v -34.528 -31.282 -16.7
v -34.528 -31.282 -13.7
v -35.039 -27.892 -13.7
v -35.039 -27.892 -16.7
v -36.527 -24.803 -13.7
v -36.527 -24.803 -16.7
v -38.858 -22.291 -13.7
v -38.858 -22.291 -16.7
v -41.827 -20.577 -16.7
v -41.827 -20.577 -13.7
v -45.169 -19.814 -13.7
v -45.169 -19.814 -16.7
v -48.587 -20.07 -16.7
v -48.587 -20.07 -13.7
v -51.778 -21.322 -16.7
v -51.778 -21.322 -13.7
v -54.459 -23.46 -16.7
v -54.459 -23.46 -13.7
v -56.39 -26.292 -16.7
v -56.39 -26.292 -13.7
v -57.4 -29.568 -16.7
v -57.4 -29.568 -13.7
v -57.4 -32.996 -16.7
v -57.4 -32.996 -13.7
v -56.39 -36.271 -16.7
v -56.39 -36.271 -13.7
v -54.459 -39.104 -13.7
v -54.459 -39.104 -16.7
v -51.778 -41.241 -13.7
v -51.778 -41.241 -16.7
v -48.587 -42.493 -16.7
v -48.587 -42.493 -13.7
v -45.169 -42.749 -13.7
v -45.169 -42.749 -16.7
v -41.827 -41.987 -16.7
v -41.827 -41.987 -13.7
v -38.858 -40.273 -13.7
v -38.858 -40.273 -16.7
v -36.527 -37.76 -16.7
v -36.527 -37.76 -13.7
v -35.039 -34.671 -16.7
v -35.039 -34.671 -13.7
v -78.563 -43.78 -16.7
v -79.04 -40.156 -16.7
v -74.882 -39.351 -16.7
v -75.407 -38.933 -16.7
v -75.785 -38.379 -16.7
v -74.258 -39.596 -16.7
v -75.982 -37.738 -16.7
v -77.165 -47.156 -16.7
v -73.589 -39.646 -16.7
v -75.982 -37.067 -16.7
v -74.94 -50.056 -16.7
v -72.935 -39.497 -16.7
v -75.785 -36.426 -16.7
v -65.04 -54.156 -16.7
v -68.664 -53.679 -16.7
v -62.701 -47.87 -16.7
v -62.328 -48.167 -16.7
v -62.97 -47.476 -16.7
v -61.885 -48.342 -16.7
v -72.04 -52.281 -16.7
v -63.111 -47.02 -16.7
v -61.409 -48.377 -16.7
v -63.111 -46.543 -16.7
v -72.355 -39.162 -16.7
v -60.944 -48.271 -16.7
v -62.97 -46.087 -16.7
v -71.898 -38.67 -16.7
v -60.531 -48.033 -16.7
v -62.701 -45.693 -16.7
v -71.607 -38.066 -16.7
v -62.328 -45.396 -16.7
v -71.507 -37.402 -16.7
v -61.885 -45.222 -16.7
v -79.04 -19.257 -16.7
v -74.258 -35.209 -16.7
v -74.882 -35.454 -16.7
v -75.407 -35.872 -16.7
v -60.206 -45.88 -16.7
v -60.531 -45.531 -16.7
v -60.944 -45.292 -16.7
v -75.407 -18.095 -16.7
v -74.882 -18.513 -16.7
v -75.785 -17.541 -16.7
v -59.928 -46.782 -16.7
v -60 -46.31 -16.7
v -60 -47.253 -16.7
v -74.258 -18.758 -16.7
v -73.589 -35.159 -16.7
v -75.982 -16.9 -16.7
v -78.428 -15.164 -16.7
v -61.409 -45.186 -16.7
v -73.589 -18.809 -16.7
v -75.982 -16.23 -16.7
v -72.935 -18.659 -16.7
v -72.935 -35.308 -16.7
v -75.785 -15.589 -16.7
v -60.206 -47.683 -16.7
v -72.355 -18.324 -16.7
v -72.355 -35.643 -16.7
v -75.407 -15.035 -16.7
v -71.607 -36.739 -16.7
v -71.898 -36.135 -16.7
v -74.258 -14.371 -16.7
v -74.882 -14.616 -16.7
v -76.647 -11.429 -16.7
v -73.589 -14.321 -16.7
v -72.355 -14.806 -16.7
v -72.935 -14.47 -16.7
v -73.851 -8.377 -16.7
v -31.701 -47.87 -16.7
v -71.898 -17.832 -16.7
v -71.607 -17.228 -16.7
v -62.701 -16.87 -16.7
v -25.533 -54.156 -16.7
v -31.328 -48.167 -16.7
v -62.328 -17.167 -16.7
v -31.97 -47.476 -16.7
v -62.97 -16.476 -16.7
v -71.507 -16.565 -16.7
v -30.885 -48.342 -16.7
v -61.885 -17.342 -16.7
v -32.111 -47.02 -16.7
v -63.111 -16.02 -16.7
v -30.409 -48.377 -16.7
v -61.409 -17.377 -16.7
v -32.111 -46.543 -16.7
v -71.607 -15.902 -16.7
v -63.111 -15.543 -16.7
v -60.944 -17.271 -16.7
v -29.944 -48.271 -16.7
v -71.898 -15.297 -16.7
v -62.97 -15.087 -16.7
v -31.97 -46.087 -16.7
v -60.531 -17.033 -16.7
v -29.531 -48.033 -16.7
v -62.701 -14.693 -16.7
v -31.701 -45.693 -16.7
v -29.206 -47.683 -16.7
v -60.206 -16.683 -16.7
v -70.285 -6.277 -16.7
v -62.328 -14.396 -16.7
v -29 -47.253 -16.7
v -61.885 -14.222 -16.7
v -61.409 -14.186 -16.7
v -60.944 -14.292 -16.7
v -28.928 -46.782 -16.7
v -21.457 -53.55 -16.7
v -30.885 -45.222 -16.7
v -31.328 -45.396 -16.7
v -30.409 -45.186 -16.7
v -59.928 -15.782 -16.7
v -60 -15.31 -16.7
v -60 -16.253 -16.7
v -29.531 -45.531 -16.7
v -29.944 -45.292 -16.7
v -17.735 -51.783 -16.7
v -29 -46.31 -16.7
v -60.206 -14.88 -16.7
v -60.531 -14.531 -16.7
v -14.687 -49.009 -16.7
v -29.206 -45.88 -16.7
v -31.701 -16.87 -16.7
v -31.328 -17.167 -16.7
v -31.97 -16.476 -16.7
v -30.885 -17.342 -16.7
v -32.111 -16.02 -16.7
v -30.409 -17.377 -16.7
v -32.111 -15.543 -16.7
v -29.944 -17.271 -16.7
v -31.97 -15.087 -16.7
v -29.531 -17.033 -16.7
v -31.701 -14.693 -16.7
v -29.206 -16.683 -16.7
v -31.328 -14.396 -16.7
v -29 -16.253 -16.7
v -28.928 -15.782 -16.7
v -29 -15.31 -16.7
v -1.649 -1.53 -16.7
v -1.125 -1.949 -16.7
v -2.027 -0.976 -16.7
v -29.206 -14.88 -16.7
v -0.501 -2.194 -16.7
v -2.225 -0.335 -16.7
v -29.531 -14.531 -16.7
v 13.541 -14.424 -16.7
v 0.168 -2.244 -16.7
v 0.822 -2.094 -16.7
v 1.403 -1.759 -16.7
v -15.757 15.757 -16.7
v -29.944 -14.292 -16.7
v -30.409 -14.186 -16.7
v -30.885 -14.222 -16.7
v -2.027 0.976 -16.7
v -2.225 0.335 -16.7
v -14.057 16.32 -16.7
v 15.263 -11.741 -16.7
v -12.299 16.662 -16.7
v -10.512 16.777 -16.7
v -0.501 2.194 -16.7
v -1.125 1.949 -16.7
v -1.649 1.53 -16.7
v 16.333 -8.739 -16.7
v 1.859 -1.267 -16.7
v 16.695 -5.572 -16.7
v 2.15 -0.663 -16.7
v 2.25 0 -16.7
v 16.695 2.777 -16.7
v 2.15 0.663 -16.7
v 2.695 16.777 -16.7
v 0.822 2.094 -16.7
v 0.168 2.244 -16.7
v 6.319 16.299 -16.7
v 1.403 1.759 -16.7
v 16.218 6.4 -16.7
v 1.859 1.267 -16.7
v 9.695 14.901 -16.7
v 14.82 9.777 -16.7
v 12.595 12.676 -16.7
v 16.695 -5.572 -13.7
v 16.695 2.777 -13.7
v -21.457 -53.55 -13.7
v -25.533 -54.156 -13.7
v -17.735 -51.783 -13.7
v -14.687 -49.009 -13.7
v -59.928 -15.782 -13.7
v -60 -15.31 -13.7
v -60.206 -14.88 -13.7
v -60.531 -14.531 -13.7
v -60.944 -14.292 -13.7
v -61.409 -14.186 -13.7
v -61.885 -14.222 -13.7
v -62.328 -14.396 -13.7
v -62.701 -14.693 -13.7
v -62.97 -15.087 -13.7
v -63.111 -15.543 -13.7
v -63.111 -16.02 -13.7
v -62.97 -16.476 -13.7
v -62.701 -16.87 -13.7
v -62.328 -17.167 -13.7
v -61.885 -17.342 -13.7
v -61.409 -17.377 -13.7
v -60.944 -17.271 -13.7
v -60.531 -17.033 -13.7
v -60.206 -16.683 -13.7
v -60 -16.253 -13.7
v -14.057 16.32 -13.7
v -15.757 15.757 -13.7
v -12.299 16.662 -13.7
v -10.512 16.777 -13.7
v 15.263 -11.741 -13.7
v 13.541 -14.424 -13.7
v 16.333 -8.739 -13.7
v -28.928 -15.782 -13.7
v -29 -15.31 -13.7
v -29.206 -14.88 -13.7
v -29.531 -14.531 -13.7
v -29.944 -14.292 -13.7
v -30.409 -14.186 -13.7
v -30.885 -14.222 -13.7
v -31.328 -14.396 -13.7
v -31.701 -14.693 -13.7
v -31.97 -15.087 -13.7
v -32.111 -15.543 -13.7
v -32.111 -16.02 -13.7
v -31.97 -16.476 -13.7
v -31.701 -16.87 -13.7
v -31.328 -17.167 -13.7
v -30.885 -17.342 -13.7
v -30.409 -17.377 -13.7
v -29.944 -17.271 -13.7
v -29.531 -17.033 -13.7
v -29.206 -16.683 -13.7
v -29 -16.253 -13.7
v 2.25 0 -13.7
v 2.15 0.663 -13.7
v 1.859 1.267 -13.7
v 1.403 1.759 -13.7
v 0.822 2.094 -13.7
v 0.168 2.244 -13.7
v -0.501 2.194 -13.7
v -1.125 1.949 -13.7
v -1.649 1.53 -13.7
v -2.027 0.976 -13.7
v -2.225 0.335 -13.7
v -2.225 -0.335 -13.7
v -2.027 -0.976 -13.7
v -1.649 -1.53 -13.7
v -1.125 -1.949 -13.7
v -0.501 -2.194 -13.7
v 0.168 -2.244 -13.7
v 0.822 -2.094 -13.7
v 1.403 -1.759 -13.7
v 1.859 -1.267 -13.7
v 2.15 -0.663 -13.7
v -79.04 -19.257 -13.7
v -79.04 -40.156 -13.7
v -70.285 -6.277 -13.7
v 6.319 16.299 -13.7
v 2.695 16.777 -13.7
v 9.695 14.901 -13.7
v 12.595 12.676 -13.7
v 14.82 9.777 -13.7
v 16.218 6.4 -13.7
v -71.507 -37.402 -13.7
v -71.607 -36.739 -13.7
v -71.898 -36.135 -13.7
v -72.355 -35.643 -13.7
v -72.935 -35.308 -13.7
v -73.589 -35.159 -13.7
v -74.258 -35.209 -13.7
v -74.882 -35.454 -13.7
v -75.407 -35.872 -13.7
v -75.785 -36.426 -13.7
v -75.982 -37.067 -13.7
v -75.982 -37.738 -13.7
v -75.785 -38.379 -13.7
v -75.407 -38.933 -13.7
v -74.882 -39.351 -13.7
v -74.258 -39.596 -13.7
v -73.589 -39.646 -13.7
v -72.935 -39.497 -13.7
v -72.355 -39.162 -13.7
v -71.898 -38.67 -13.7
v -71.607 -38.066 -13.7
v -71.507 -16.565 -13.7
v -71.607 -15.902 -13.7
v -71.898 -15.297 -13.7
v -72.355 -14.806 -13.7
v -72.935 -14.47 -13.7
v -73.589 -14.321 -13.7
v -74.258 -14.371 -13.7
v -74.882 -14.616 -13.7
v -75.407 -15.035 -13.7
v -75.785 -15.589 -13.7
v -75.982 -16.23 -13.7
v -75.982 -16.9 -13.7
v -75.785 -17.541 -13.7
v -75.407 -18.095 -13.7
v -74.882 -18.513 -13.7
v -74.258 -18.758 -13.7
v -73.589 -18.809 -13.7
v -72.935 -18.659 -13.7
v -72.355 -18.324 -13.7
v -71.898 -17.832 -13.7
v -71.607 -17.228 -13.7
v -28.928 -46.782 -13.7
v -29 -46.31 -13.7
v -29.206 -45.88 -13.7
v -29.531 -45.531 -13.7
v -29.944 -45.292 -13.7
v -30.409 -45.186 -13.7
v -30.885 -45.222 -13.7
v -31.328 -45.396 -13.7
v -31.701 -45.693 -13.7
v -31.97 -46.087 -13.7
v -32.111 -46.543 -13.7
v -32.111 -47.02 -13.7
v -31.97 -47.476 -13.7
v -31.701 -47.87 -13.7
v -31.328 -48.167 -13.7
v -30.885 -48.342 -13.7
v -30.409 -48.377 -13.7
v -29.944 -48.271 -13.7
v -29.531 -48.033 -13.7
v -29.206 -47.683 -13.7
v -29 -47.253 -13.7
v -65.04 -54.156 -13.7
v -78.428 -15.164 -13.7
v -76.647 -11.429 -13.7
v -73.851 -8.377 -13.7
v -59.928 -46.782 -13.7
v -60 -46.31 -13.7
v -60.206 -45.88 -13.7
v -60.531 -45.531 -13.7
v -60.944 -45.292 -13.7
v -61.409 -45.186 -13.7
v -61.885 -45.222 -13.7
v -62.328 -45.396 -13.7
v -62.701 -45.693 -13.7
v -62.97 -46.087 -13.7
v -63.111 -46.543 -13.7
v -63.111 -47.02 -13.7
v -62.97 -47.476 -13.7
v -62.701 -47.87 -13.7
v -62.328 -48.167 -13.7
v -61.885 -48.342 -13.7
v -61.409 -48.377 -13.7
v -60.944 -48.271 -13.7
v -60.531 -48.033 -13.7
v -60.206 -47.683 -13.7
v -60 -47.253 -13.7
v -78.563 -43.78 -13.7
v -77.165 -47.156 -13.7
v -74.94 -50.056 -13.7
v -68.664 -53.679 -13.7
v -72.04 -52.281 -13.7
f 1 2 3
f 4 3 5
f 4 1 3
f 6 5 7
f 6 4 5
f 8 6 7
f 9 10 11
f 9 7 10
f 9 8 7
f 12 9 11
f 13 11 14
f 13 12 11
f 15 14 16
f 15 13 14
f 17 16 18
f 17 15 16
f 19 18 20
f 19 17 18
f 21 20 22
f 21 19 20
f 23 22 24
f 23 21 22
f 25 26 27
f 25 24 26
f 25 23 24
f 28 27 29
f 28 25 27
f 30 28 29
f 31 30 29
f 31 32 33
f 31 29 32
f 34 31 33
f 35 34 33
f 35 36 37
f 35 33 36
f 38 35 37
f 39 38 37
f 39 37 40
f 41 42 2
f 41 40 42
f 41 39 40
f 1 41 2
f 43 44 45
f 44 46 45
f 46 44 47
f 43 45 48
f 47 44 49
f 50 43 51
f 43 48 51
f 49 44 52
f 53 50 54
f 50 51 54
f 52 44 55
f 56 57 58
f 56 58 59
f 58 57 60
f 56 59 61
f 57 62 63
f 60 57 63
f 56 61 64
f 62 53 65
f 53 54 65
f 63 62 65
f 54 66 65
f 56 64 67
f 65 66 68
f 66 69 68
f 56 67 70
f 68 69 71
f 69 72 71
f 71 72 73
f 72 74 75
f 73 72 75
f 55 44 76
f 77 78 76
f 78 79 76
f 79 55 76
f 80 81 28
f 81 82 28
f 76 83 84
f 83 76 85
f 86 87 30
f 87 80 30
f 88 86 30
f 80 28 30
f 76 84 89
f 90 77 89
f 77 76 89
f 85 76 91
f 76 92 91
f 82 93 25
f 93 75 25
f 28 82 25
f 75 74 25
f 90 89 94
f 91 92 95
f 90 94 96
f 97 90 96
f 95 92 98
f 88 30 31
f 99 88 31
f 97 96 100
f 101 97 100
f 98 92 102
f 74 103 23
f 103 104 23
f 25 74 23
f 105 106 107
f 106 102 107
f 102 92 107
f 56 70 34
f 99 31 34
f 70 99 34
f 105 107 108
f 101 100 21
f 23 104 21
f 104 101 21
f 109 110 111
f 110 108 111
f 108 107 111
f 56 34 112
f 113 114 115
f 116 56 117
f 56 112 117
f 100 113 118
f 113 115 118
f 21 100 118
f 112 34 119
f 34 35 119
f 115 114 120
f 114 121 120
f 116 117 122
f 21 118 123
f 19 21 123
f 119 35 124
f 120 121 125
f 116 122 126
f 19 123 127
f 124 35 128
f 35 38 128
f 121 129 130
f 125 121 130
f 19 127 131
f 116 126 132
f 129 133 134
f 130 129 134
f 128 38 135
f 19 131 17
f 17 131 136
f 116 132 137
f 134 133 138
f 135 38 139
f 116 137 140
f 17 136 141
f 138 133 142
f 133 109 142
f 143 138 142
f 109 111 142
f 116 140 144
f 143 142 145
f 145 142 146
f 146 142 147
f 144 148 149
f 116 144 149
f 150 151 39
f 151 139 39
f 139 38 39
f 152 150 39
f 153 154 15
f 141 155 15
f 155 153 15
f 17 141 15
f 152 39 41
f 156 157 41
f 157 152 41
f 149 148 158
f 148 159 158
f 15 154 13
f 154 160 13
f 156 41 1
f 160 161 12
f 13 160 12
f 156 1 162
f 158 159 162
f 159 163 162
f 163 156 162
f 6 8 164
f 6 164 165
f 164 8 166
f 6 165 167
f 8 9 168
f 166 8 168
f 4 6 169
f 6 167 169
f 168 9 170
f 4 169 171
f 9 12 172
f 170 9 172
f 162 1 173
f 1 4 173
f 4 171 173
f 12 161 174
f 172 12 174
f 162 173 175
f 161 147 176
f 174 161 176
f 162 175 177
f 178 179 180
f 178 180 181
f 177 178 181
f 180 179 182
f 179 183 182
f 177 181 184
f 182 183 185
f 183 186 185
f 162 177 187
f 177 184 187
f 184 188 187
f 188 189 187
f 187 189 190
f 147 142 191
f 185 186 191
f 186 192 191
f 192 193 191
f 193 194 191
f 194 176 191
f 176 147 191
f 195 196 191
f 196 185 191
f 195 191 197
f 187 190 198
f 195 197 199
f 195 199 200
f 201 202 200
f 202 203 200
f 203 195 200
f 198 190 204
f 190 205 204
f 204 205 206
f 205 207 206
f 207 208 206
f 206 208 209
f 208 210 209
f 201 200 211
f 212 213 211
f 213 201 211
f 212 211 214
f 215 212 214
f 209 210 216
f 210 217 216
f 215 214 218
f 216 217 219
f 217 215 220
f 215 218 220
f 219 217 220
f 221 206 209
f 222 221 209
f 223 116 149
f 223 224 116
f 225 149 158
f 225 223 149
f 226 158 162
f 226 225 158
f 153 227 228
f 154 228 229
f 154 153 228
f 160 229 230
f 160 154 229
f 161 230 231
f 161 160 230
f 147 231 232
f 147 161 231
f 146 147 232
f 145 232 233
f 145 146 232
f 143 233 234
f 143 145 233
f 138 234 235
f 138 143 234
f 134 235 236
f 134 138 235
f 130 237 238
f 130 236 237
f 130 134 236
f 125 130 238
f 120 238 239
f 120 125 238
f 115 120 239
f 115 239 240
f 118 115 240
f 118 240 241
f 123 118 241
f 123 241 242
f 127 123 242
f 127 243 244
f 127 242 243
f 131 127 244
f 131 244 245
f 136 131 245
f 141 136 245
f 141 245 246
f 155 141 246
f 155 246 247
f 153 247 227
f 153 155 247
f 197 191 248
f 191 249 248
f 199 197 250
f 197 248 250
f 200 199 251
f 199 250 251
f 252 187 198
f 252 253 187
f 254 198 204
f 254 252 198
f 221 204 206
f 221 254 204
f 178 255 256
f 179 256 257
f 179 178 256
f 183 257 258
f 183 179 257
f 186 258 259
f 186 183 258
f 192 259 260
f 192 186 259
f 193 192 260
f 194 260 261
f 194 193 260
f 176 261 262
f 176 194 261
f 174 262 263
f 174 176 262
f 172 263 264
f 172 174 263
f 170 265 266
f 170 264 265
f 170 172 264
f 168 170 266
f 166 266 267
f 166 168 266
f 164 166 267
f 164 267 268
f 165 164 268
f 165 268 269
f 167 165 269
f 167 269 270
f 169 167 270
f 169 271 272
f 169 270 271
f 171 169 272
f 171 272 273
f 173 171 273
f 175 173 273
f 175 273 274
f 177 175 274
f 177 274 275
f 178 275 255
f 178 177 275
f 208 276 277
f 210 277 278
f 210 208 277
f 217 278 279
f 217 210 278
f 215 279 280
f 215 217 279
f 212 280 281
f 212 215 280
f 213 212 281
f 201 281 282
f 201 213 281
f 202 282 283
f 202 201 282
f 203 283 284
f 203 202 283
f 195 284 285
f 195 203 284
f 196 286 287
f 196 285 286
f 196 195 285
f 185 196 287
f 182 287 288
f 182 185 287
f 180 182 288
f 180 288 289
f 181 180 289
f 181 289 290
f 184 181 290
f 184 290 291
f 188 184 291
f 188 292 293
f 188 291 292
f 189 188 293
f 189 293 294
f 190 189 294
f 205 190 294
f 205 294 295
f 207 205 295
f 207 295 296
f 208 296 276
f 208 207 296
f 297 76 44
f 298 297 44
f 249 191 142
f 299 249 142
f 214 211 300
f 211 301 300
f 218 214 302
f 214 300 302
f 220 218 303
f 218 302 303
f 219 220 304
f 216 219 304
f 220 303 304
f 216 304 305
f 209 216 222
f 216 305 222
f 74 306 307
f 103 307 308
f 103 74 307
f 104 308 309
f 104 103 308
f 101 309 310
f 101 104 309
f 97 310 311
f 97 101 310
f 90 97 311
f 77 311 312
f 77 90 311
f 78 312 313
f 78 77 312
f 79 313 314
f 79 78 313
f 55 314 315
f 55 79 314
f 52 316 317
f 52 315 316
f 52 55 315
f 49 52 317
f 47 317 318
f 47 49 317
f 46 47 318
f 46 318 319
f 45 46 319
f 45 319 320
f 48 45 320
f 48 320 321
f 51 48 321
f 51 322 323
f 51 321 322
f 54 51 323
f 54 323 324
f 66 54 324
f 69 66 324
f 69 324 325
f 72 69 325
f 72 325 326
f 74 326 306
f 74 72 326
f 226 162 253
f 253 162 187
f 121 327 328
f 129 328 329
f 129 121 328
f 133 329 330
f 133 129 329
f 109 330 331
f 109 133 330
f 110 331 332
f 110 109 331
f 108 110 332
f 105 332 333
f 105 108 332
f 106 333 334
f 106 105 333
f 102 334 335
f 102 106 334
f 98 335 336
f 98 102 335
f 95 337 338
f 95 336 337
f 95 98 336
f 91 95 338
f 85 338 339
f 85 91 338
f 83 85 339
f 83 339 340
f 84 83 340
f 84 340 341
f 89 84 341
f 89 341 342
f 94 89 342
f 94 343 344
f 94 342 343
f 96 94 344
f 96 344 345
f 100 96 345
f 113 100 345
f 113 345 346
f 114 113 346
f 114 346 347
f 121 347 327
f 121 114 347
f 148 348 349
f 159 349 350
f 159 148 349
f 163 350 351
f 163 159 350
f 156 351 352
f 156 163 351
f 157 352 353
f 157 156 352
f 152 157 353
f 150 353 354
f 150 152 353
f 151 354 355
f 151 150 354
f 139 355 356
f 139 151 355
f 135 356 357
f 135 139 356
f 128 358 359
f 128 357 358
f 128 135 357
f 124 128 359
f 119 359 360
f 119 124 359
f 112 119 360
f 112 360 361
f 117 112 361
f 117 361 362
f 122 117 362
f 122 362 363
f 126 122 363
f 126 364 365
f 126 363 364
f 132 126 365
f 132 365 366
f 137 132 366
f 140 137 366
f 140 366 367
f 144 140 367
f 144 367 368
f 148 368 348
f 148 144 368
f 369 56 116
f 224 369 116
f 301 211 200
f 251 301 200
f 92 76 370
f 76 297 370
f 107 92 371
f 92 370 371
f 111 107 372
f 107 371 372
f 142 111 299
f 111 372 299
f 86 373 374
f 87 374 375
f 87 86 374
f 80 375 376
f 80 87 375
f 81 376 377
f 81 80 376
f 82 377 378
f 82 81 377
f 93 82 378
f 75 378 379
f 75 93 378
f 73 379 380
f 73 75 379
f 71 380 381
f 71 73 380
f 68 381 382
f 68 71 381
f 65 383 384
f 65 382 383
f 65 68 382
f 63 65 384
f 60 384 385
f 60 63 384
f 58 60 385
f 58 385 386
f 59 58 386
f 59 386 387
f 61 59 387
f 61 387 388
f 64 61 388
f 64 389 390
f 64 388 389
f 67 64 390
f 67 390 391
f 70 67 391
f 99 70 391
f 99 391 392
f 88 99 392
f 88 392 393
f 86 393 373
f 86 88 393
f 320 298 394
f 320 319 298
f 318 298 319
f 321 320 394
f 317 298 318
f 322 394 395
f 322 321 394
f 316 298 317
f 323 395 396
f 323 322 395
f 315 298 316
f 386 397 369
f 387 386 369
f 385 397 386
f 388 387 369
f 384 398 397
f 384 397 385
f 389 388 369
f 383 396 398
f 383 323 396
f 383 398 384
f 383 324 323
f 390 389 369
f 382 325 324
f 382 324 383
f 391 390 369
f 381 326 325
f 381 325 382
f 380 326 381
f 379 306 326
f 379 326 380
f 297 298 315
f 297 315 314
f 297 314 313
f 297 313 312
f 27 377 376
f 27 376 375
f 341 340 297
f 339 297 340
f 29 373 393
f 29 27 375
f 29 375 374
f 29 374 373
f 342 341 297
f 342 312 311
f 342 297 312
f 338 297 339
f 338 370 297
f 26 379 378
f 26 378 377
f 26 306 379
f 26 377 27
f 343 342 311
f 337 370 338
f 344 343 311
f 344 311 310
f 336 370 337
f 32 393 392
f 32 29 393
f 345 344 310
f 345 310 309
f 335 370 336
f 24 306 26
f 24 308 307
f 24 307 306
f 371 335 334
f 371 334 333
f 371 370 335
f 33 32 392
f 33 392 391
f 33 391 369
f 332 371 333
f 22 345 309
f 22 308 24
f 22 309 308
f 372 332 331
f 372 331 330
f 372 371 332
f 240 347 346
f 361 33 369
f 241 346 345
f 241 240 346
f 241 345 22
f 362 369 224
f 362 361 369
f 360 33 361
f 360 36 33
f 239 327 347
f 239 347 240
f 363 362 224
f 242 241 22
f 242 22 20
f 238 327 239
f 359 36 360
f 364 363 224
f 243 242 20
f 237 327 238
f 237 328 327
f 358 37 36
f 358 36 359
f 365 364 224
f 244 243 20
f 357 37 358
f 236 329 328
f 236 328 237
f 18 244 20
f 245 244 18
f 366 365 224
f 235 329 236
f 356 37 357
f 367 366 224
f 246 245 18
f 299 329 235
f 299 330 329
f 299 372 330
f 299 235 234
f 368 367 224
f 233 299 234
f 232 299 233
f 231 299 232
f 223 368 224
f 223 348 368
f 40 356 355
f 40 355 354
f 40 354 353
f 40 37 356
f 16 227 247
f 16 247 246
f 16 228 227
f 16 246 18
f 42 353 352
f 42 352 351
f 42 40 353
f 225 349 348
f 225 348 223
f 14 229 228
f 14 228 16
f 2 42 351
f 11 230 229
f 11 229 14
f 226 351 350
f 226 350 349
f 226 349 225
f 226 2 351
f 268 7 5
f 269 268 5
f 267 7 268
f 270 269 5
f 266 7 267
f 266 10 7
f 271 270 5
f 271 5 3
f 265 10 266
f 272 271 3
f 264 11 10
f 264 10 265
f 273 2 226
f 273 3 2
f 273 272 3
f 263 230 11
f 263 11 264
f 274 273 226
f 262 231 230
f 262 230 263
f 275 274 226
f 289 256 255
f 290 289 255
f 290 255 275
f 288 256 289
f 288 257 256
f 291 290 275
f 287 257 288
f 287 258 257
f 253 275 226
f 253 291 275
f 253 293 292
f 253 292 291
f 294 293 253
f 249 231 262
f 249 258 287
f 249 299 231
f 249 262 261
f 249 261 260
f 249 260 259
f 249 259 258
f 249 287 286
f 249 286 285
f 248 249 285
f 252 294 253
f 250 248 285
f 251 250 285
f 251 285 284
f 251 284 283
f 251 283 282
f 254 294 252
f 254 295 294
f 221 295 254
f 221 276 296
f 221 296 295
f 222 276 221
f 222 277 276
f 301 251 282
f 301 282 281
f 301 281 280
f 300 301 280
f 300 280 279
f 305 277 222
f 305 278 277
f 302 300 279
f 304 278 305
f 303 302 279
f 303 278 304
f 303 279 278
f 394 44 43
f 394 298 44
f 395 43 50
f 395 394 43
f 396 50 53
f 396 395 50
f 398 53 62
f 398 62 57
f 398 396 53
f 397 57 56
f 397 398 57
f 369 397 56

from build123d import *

# Parameters (mm, degrees)
PAD004_DEPTH         = 3
SKETCH004_R          = 2.25
SKETCH004_R_2        = 1.6
SKETCH004_R_3        = 11.5
POCKET002_DEPTH      = 0.001
POCKET002_DEPTH_BACK = 3.001
FILLET001_R          = 14


with BuildPart() as part:
    # Sketch003 → Pad004 (new body)
    with BuildSketch(Plane.XY):
        Polygon((-79.04016, -9.81434), (-79.04016, -54.156483), (-18.88891, -54.156483), (16.695431, -10.559778), (16.695431, 16.776531), (-13.233119, 16.776531), align=None)
    extrude(amount=PAD004_DEPTH)

    # Sketch004 → Pocket002 (cut, two sides)
    with BuildSketch(Plane.XY) as pocket002_sk:
        Circle(SKETCH004_R)
        with Locations((-61.528467, -15.781639)):
            Circle(SKETCH004_R_2)
        with Locations((-30.528467, -15.781639)):
            Circle(SKETCH004_R_2)
        with Locations((-61.528467, -46.781639)):
            Circle(SKETCH004_R_2)
        with Locations((-30.528467, -46.781639)):
            Circle(SKETCH004_R_2)
        with Locations((-46.028467, -31.281639)):
            Circle(SKETCH004_R_3)
        with Locations((-73.757385, -16.564894)):
            Circle(SKETCH004_R)
        with Locations((-73.757385, -37.402451)):
            Circle(SKETCH004_R)
    extrude(amount=-POCKET002_DEPTH, mode=Mode.SUBTRACT)
    extrude(pocket002_sk.sketch, amount=POCKET002_DEPTH_BACK, mode=Mode.SUBTRACT)

    # Fillet001
    fillet001_edges = [part.edges().sort_by_distance(p)[0] for p in [
        (-79.04016, -54.156483, 1.5),
        (-79.04016, -9.81434, 1.5),
        (-18.88891, -54.156483, 1.5),
        (16.695431, -10.559778, 1.5),
        (16.695431, 16.776531, 1.5),
        (-13.233119, 16.776531, 1.5),
    ]]
    fillet(fillet001_edges, radius=FILLET001_R)


with BuildPart() as part_1:
    # Body003 placement: moved
    add(part.part.moved(Location((0, 0, -16.7))))


solid = part_1.part
